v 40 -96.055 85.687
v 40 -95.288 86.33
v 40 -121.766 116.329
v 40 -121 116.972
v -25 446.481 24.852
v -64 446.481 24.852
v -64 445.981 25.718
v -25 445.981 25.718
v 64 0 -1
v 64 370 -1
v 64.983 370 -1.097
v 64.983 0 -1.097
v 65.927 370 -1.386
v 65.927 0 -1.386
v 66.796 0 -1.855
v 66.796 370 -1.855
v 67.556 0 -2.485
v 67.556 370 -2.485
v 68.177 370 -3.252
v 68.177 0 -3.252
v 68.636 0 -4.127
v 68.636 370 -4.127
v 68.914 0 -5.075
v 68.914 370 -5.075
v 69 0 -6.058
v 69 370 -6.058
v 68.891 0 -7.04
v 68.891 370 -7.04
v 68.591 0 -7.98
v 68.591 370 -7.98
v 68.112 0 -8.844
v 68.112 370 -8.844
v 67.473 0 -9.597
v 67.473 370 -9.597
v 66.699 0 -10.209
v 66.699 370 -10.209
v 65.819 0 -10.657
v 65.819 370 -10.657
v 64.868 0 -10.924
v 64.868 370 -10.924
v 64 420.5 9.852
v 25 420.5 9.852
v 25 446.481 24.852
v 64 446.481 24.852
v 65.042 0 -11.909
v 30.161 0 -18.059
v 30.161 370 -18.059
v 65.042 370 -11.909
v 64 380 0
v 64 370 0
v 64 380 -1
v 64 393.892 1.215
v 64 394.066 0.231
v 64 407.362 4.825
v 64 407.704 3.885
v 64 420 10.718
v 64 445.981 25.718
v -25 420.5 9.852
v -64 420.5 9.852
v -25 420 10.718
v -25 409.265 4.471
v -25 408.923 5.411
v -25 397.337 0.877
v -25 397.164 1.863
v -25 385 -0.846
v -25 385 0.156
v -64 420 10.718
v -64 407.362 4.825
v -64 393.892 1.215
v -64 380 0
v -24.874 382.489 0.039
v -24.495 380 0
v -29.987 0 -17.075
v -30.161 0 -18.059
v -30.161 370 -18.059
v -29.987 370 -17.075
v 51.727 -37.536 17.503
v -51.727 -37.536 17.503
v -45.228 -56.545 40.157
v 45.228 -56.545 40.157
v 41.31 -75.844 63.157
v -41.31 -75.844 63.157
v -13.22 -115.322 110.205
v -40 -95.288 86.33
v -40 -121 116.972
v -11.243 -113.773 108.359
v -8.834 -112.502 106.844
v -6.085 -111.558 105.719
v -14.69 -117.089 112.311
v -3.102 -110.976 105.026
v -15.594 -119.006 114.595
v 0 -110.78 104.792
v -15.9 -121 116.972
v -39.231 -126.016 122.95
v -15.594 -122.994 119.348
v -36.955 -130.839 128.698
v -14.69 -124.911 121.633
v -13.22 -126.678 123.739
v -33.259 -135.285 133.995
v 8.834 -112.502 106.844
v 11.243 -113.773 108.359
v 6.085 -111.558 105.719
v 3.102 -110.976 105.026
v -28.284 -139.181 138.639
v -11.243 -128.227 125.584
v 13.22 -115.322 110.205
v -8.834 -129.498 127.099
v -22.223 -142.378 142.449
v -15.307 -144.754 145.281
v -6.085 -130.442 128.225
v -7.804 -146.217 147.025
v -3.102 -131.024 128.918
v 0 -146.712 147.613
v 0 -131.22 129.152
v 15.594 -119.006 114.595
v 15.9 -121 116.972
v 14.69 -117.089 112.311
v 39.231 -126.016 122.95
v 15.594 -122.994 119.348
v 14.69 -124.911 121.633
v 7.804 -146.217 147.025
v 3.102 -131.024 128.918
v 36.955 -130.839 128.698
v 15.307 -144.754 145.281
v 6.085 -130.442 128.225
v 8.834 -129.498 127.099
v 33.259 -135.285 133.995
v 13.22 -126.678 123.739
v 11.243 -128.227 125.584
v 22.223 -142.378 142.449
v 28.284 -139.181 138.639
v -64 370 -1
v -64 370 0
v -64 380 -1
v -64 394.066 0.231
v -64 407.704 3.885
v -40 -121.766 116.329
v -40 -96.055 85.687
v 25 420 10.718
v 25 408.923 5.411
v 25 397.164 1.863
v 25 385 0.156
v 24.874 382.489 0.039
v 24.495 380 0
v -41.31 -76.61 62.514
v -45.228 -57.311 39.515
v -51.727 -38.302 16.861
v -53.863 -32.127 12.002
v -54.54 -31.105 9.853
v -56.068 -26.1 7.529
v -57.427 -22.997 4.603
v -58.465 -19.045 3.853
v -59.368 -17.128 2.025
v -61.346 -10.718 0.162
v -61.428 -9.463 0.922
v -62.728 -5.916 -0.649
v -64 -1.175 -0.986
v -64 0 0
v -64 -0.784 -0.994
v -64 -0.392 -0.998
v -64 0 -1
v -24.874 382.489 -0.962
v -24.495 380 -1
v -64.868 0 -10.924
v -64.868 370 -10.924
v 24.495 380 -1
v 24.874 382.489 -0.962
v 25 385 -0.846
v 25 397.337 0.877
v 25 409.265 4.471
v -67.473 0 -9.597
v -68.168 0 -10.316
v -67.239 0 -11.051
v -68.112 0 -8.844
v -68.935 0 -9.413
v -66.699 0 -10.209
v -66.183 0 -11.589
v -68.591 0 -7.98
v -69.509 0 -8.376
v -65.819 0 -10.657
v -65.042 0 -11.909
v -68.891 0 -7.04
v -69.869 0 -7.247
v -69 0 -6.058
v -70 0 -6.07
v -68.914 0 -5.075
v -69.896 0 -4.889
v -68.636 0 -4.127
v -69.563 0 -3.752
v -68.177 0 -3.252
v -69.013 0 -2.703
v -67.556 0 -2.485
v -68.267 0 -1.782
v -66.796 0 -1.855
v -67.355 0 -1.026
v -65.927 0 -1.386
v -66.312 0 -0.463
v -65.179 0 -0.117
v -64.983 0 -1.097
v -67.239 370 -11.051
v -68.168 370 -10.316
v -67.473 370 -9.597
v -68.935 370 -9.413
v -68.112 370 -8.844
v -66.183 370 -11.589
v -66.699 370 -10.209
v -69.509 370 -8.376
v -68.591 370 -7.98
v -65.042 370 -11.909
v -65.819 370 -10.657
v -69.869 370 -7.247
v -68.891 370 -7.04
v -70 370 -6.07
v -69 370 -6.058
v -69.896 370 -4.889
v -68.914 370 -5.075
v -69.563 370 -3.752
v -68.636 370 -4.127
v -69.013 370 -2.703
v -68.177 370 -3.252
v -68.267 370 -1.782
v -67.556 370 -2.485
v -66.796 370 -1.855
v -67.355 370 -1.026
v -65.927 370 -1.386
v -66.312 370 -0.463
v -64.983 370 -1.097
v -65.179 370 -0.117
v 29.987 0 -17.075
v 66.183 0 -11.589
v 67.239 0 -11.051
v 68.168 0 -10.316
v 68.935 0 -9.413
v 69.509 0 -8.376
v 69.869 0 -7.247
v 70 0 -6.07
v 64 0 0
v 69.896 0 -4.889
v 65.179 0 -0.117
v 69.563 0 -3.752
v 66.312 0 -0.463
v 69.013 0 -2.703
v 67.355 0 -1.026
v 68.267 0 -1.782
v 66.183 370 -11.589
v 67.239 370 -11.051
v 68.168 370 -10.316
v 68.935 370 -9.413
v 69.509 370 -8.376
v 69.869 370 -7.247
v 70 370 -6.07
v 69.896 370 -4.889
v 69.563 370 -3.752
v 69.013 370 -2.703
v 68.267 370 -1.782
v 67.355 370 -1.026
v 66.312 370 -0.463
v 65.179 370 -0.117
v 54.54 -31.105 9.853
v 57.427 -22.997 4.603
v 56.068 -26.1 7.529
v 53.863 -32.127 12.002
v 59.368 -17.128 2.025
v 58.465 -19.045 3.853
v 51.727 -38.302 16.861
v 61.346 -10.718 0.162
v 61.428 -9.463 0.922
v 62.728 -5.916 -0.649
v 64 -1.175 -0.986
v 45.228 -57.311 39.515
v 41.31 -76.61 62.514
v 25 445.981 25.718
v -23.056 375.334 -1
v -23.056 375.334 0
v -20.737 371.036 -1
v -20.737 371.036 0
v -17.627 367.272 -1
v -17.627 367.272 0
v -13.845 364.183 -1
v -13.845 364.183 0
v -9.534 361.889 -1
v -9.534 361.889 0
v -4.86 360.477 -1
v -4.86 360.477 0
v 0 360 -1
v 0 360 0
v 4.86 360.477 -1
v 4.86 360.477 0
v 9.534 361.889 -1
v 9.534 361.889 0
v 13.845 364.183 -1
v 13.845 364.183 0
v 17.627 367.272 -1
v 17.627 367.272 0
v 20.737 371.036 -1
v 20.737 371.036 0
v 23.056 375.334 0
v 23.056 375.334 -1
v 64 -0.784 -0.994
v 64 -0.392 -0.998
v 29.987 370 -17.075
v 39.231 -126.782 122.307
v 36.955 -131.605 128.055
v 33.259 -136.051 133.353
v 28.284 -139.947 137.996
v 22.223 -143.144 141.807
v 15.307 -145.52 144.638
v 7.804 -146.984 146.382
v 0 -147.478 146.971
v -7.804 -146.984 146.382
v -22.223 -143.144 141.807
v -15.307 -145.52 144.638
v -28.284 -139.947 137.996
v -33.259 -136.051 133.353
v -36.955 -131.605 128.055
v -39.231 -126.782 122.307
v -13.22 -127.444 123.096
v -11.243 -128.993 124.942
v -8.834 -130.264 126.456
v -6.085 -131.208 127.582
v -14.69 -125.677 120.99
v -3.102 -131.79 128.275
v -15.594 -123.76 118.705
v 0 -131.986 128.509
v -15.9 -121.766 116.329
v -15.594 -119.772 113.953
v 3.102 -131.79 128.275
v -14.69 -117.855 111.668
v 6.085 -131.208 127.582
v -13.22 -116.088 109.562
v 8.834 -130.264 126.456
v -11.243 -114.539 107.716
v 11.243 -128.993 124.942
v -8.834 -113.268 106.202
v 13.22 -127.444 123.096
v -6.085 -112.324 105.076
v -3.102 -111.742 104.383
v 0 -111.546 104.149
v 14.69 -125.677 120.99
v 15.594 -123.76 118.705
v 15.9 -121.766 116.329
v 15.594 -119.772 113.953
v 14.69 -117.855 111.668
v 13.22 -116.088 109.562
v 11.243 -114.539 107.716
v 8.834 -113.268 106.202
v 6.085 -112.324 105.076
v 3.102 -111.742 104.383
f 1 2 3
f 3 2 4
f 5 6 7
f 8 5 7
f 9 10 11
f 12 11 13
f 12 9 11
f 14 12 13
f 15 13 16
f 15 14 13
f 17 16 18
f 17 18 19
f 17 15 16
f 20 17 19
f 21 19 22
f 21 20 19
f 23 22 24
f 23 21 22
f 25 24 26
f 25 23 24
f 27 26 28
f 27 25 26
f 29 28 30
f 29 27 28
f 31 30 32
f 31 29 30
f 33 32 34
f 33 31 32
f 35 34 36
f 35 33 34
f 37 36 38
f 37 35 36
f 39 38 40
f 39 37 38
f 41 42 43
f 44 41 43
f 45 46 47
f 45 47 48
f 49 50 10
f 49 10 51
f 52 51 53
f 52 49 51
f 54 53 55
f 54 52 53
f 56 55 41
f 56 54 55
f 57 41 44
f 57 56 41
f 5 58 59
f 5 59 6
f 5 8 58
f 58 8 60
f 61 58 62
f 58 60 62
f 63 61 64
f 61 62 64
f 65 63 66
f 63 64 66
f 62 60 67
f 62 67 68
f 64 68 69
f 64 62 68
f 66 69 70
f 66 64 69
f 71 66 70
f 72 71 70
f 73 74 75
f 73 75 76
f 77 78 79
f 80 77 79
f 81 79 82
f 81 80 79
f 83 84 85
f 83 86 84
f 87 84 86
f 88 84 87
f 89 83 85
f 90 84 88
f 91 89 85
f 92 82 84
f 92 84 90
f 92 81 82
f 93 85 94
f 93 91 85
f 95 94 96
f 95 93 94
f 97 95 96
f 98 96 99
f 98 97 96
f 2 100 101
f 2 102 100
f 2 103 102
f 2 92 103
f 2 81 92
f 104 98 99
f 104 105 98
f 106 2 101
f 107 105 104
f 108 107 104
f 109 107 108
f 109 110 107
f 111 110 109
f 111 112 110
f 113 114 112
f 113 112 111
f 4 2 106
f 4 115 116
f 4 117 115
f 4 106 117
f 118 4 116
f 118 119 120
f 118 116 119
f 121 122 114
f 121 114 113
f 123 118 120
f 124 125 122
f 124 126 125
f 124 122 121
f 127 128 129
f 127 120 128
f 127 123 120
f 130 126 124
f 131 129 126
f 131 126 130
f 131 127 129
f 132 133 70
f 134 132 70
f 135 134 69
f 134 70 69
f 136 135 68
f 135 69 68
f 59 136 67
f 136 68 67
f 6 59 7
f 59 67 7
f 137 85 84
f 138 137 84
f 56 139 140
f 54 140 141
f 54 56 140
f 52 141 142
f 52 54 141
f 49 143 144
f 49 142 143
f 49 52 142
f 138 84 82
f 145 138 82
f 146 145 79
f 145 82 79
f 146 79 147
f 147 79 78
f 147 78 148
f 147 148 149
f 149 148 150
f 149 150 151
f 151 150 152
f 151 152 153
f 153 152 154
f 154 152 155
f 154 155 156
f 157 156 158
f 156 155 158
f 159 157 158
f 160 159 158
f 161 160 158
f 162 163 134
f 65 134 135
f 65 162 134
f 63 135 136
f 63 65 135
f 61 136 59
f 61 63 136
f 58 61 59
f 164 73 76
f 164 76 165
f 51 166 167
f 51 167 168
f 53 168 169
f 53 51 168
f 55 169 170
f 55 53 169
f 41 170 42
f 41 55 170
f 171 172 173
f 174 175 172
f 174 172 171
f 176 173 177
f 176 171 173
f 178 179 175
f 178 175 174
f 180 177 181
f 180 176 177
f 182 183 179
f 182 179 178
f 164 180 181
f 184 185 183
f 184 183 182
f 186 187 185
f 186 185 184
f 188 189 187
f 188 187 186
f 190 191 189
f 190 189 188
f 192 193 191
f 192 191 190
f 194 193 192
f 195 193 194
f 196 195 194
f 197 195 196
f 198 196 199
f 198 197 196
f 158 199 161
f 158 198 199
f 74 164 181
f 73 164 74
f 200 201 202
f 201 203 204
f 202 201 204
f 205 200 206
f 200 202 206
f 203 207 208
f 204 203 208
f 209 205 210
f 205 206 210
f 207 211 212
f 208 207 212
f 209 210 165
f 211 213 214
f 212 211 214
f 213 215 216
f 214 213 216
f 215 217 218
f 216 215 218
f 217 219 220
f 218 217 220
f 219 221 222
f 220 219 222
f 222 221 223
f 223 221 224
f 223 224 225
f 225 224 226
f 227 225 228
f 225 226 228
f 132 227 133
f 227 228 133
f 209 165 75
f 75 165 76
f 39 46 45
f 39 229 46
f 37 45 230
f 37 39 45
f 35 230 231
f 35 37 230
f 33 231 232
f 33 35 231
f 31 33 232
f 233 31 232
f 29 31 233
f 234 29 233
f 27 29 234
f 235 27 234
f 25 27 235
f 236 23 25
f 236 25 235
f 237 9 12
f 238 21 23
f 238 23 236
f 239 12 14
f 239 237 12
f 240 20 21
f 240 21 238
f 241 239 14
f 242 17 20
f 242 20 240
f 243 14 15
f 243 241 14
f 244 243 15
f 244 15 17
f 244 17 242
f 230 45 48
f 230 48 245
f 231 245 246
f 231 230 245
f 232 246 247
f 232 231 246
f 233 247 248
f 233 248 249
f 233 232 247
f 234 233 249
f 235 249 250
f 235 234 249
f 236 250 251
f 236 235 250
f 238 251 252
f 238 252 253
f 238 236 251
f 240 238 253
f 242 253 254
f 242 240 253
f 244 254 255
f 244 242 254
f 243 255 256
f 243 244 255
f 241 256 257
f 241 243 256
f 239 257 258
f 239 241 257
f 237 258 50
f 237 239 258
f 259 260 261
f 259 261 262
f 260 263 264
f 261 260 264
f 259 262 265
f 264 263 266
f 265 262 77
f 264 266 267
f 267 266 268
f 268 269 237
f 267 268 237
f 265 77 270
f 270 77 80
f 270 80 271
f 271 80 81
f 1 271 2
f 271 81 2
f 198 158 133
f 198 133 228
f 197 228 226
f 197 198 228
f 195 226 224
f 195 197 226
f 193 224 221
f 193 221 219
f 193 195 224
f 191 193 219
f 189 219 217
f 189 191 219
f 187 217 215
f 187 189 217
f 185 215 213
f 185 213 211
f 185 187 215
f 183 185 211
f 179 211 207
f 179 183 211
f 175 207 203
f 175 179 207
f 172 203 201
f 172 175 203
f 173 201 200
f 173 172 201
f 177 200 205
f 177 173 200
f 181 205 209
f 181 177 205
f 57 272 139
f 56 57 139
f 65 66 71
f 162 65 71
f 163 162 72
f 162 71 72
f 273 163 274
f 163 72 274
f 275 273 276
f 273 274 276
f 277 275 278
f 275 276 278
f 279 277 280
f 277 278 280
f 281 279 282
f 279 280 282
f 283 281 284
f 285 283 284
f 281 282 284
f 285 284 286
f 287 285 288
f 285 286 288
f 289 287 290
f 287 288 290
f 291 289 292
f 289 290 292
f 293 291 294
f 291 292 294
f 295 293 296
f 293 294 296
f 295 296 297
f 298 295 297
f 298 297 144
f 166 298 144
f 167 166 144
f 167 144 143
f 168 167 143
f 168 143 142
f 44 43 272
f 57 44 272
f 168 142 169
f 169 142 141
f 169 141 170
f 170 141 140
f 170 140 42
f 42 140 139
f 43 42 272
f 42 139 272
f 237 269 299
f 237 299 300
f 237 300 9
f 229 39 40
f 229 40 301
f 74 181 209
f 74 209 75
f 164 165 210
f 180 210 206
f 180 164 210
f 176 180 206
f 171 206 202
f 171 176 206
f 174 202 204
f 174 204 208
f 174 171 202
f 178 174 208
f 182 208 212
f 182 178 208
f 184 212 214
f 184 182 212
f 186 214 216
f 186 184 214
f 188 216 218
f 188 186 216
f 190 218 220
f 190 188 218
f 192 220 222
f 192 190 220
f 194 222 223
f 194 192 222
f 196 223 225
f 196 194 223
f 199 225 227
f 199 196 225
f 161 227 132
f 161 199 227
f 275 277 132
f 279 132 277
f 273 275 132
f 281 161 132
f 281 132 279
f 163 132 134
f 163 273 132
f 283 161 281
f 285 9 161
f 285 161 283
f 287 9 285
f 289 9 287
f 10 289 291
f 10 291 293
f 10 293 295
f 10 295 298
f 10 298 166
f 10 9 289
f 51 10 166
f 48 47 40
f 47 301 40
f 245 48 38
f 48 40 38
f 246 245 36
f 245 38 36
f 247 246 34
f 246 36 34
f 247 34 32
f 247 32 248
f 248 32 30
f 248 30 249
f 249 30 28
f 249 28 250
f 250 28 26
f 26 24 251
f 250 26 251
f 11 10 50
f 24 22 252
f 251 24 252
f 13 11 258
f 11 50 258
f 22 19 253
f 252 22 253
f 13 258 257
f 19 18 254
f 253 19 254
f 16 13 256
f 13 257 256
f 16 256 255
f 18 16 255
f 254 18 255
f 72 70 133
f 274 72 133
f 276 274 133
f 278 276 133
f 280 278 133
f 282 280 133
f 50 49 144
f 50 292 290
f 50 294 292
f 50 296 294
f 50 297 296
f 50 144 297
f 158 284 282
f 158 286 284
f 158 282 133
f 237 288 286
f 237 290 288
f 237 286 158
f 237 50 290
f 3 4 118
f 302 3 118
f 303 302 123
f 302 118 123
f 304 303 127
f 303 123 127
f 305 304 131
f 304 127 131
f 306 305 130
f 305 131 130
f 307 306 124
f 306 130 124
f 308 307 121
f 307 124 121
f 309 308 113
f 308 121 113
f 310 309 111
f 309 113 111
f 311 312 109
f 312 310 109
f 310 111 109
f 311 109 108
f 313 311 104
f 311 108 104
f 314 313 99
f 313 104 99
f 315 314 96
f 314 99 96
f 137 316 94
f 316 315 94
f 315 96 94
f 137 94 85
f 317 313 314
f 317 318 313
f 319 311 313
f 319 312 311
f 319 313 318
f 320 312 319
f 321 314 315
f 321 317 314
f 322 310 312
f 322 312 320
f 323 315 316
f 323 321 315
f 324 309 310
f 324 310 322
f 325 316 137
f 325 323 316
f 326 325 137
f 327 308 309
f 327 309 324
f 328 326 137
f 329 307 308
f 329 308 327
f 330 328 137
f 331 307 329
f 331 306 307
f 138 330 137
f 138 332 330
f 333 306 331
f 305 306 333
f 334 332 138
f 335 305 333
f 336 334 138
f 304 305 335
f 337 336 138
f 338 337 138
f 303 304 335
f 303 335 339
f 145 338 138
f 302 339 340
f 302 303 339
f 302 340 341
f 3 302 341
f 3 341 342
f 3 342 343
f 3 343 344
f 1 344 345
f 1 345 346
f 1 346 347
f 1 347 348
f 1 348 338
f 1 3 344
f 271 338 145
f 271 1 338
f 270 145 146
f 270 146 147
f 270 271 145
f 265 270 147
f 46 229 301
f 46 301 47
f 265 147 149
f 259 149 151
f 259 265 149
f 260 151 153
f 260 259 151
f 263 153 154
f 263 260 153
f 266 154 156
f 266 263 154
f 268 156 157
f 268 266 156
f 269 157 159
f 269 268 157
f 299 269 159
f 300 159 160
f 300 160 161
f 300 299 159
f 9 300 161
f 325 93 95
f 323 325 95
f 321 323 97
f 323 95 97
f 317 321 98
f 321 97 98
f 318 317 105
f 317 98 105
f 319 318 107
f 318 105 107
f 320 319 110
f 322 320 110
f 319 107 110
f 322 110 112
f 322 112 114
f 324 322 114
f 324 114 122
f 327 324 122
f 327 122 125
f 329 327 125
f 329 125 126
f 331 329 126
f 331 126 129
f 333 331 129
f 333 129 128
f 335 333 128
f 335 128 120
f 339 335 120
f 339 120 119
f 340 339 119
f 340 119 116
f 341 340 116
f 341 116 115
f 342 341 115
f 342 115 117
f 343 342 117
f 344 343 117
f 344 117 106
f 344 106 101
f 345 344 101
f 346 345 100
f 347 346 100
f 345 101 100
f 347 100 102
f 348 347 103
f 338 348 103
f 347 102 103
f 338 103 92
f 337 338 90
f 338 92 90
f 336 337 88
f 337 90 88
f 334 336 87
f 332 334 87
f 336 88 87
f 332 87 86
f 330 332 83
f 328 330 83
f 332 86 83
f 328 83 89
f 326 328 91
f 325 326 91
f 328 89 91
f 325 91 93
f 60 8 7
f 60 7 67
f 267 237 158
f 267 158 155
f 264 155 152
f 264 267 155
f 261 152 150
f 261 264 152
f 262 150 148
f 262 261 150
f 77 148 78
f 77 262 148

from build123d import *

# Parameters (mm, degrees)
F1_DEPTH = 64
F3_DEPTH = 370
F6_DEPTH = 500
F8_R     = 15.9
F9_DEPTH = 600


# Not quite as in the source:
# - a feature names something its author has since deleted; it is built from what else it names


with BuildPart() as f1:
    # F0 (on Right) → F1 (new body, symmetric)
    with BuildSketch(Plane.YZ):
        with BuildLine():
            Line((380, 0), (0, 0))
            ThreePointArc((0, 0), (-20.7082948253, 4.5909184352), (-37.5361777128, 17.5034071254))
            Line((-37.5361777128, 17.5034071254), (-121, 116.9717171877))
            Line((-121, 116.9717171877), (-187.1849916482, 195.8479187603))
            Line((-187.1849916482, 195.8479187603), (-187.8376952929, 195.0700568469))
            Line((-187.8376952929, 195.0700568469), (-128.3694552412, 124.1985681201))
            Line((-128.3694552412, 124.1985681201), (-38.3022221559, 16.8606195157))
            ThreePointArc((-38.3022221559, 16.8606195157), (-21.130913087, 3.6846106482), (0, -1))
            Line((0, -1), (380, -1))
            ThreePointArc((380, -1), (400.9643426533, 1.7600080706), (420.5, 9.8519422935))
            Line((420.5, 9.8519422935), (446.4807621135, 24.8519422935))
            Line((446.4807621135, 24.8519422935), (445.9807621135, 25.7179676972))
            Line((445.9807621135, 25.7179676972), (420, 10.7179676972))
            ThreePointArc((420, 10.7179676972), (400.7055236082, 2.7259338969), (380, 0))
        make_face()
    extrude(amount=F1_DEPTH, both=True)

    # F2 (on Front) → F3 (join)
    with BuildSketch(Plane.XZ):
        with BuildLine():
            ThreePointArc((65.041889066, -11.9088465181), (69.9771681886, -5.4770655435), (64, 0))
            Line((64, 0), (-64, 0))
            ThreePointArc((-64, 0), (-69.9771681886, -5.4770655435), (-65.041889066, -11.9088465181))
            Line((-65.041889066, -11.9088465181), (-30.1606090351, -18.0593573092))
            Line((-30.1606090351, -18.0593573092), (-29.9869608574, -17.0745495562))
            Line((-29.9869608574, -17.0745495562), (-64.8682408883, -10.9240387651))
            ThreePointArc((-64.8682408883, -10.9240387651), (-68.9809734905, -5.5642212863), (-64, -1))
            Line((-64, -1), (64, -1))
            ThreePointArc((64, -1), (68.9809734905, -5.5642212863), (64.8682408883, -10.9240387651))
            Line((64.8682408883, -10.9240387651), (29.9869608574, -17.0745495562))
            Line((29.9869608574, -17.0745495562), (30.1606090351, -18.0593573092))
            Line((30.1606090351, -18.0593573092), (65.041889066, -11.9088465181))
        make_face()
    extrude(amount=-F3_DEPTH)

    # F5 (on offset) → F6 (cut)
    with BuildSketch(Plane.XY.offset(400)):
        with BuildLine():
            Line((-25, 446.4807621135), (-25, 385))
            ThreePointArc((-25, 385), (0, 360), (25, 385))
            Line((25, 385), (25, 446.4807621135))
            Line((25, 446.4807621135), (-25, 446.4807621135))
        make_face()
    extrude(amount=-F6_DEPTH, mode=Mode.SUBTRACT)

    # F8 (on offset) → F9 (cut)
    with BuildSketch(Plane(origin=(0, 369.6138337955, 310.1428316158), x_dir=(-1, 0, 0), z_dir=(0, 0.7660444431, 0.6427876097))):
        with Locations((0, 167.3828347258)):
            Circle(F8_R)
        with BuildLine():
            ThreePointArc((-40, 167.3828347258), (0, 207.3828347258), (40, 167.3828347258))
            Line((40, 167.3828347258), (40, 127.3828347258))
            ThreePointArc((40, 127.3828347258), (46.052321998, 62.5708246837), (64, 0))
            Line((64, 0), (64, 37.5361777128))
            Line((64, 37.5361777128), (64, 270.3484032135))
            Line((64, 270.3484032135), (-64, 270.3484032135))
            Line((-64, 270.3484032135), (-64, 37.5361777128))
            Line((-64, 37.5361777128), (-64, 0))
            ThreePointArc((-64, 0), (-46.052321998, 62.5708246837), (-40, 127.3828347258))
            Line((-40, 127.3828347258), (-40, 167.3828347258))
        make_face()
    extrude(amount=-F9_DEPTH, mode=Mode.SUBTRACT)


solid = f1.part
